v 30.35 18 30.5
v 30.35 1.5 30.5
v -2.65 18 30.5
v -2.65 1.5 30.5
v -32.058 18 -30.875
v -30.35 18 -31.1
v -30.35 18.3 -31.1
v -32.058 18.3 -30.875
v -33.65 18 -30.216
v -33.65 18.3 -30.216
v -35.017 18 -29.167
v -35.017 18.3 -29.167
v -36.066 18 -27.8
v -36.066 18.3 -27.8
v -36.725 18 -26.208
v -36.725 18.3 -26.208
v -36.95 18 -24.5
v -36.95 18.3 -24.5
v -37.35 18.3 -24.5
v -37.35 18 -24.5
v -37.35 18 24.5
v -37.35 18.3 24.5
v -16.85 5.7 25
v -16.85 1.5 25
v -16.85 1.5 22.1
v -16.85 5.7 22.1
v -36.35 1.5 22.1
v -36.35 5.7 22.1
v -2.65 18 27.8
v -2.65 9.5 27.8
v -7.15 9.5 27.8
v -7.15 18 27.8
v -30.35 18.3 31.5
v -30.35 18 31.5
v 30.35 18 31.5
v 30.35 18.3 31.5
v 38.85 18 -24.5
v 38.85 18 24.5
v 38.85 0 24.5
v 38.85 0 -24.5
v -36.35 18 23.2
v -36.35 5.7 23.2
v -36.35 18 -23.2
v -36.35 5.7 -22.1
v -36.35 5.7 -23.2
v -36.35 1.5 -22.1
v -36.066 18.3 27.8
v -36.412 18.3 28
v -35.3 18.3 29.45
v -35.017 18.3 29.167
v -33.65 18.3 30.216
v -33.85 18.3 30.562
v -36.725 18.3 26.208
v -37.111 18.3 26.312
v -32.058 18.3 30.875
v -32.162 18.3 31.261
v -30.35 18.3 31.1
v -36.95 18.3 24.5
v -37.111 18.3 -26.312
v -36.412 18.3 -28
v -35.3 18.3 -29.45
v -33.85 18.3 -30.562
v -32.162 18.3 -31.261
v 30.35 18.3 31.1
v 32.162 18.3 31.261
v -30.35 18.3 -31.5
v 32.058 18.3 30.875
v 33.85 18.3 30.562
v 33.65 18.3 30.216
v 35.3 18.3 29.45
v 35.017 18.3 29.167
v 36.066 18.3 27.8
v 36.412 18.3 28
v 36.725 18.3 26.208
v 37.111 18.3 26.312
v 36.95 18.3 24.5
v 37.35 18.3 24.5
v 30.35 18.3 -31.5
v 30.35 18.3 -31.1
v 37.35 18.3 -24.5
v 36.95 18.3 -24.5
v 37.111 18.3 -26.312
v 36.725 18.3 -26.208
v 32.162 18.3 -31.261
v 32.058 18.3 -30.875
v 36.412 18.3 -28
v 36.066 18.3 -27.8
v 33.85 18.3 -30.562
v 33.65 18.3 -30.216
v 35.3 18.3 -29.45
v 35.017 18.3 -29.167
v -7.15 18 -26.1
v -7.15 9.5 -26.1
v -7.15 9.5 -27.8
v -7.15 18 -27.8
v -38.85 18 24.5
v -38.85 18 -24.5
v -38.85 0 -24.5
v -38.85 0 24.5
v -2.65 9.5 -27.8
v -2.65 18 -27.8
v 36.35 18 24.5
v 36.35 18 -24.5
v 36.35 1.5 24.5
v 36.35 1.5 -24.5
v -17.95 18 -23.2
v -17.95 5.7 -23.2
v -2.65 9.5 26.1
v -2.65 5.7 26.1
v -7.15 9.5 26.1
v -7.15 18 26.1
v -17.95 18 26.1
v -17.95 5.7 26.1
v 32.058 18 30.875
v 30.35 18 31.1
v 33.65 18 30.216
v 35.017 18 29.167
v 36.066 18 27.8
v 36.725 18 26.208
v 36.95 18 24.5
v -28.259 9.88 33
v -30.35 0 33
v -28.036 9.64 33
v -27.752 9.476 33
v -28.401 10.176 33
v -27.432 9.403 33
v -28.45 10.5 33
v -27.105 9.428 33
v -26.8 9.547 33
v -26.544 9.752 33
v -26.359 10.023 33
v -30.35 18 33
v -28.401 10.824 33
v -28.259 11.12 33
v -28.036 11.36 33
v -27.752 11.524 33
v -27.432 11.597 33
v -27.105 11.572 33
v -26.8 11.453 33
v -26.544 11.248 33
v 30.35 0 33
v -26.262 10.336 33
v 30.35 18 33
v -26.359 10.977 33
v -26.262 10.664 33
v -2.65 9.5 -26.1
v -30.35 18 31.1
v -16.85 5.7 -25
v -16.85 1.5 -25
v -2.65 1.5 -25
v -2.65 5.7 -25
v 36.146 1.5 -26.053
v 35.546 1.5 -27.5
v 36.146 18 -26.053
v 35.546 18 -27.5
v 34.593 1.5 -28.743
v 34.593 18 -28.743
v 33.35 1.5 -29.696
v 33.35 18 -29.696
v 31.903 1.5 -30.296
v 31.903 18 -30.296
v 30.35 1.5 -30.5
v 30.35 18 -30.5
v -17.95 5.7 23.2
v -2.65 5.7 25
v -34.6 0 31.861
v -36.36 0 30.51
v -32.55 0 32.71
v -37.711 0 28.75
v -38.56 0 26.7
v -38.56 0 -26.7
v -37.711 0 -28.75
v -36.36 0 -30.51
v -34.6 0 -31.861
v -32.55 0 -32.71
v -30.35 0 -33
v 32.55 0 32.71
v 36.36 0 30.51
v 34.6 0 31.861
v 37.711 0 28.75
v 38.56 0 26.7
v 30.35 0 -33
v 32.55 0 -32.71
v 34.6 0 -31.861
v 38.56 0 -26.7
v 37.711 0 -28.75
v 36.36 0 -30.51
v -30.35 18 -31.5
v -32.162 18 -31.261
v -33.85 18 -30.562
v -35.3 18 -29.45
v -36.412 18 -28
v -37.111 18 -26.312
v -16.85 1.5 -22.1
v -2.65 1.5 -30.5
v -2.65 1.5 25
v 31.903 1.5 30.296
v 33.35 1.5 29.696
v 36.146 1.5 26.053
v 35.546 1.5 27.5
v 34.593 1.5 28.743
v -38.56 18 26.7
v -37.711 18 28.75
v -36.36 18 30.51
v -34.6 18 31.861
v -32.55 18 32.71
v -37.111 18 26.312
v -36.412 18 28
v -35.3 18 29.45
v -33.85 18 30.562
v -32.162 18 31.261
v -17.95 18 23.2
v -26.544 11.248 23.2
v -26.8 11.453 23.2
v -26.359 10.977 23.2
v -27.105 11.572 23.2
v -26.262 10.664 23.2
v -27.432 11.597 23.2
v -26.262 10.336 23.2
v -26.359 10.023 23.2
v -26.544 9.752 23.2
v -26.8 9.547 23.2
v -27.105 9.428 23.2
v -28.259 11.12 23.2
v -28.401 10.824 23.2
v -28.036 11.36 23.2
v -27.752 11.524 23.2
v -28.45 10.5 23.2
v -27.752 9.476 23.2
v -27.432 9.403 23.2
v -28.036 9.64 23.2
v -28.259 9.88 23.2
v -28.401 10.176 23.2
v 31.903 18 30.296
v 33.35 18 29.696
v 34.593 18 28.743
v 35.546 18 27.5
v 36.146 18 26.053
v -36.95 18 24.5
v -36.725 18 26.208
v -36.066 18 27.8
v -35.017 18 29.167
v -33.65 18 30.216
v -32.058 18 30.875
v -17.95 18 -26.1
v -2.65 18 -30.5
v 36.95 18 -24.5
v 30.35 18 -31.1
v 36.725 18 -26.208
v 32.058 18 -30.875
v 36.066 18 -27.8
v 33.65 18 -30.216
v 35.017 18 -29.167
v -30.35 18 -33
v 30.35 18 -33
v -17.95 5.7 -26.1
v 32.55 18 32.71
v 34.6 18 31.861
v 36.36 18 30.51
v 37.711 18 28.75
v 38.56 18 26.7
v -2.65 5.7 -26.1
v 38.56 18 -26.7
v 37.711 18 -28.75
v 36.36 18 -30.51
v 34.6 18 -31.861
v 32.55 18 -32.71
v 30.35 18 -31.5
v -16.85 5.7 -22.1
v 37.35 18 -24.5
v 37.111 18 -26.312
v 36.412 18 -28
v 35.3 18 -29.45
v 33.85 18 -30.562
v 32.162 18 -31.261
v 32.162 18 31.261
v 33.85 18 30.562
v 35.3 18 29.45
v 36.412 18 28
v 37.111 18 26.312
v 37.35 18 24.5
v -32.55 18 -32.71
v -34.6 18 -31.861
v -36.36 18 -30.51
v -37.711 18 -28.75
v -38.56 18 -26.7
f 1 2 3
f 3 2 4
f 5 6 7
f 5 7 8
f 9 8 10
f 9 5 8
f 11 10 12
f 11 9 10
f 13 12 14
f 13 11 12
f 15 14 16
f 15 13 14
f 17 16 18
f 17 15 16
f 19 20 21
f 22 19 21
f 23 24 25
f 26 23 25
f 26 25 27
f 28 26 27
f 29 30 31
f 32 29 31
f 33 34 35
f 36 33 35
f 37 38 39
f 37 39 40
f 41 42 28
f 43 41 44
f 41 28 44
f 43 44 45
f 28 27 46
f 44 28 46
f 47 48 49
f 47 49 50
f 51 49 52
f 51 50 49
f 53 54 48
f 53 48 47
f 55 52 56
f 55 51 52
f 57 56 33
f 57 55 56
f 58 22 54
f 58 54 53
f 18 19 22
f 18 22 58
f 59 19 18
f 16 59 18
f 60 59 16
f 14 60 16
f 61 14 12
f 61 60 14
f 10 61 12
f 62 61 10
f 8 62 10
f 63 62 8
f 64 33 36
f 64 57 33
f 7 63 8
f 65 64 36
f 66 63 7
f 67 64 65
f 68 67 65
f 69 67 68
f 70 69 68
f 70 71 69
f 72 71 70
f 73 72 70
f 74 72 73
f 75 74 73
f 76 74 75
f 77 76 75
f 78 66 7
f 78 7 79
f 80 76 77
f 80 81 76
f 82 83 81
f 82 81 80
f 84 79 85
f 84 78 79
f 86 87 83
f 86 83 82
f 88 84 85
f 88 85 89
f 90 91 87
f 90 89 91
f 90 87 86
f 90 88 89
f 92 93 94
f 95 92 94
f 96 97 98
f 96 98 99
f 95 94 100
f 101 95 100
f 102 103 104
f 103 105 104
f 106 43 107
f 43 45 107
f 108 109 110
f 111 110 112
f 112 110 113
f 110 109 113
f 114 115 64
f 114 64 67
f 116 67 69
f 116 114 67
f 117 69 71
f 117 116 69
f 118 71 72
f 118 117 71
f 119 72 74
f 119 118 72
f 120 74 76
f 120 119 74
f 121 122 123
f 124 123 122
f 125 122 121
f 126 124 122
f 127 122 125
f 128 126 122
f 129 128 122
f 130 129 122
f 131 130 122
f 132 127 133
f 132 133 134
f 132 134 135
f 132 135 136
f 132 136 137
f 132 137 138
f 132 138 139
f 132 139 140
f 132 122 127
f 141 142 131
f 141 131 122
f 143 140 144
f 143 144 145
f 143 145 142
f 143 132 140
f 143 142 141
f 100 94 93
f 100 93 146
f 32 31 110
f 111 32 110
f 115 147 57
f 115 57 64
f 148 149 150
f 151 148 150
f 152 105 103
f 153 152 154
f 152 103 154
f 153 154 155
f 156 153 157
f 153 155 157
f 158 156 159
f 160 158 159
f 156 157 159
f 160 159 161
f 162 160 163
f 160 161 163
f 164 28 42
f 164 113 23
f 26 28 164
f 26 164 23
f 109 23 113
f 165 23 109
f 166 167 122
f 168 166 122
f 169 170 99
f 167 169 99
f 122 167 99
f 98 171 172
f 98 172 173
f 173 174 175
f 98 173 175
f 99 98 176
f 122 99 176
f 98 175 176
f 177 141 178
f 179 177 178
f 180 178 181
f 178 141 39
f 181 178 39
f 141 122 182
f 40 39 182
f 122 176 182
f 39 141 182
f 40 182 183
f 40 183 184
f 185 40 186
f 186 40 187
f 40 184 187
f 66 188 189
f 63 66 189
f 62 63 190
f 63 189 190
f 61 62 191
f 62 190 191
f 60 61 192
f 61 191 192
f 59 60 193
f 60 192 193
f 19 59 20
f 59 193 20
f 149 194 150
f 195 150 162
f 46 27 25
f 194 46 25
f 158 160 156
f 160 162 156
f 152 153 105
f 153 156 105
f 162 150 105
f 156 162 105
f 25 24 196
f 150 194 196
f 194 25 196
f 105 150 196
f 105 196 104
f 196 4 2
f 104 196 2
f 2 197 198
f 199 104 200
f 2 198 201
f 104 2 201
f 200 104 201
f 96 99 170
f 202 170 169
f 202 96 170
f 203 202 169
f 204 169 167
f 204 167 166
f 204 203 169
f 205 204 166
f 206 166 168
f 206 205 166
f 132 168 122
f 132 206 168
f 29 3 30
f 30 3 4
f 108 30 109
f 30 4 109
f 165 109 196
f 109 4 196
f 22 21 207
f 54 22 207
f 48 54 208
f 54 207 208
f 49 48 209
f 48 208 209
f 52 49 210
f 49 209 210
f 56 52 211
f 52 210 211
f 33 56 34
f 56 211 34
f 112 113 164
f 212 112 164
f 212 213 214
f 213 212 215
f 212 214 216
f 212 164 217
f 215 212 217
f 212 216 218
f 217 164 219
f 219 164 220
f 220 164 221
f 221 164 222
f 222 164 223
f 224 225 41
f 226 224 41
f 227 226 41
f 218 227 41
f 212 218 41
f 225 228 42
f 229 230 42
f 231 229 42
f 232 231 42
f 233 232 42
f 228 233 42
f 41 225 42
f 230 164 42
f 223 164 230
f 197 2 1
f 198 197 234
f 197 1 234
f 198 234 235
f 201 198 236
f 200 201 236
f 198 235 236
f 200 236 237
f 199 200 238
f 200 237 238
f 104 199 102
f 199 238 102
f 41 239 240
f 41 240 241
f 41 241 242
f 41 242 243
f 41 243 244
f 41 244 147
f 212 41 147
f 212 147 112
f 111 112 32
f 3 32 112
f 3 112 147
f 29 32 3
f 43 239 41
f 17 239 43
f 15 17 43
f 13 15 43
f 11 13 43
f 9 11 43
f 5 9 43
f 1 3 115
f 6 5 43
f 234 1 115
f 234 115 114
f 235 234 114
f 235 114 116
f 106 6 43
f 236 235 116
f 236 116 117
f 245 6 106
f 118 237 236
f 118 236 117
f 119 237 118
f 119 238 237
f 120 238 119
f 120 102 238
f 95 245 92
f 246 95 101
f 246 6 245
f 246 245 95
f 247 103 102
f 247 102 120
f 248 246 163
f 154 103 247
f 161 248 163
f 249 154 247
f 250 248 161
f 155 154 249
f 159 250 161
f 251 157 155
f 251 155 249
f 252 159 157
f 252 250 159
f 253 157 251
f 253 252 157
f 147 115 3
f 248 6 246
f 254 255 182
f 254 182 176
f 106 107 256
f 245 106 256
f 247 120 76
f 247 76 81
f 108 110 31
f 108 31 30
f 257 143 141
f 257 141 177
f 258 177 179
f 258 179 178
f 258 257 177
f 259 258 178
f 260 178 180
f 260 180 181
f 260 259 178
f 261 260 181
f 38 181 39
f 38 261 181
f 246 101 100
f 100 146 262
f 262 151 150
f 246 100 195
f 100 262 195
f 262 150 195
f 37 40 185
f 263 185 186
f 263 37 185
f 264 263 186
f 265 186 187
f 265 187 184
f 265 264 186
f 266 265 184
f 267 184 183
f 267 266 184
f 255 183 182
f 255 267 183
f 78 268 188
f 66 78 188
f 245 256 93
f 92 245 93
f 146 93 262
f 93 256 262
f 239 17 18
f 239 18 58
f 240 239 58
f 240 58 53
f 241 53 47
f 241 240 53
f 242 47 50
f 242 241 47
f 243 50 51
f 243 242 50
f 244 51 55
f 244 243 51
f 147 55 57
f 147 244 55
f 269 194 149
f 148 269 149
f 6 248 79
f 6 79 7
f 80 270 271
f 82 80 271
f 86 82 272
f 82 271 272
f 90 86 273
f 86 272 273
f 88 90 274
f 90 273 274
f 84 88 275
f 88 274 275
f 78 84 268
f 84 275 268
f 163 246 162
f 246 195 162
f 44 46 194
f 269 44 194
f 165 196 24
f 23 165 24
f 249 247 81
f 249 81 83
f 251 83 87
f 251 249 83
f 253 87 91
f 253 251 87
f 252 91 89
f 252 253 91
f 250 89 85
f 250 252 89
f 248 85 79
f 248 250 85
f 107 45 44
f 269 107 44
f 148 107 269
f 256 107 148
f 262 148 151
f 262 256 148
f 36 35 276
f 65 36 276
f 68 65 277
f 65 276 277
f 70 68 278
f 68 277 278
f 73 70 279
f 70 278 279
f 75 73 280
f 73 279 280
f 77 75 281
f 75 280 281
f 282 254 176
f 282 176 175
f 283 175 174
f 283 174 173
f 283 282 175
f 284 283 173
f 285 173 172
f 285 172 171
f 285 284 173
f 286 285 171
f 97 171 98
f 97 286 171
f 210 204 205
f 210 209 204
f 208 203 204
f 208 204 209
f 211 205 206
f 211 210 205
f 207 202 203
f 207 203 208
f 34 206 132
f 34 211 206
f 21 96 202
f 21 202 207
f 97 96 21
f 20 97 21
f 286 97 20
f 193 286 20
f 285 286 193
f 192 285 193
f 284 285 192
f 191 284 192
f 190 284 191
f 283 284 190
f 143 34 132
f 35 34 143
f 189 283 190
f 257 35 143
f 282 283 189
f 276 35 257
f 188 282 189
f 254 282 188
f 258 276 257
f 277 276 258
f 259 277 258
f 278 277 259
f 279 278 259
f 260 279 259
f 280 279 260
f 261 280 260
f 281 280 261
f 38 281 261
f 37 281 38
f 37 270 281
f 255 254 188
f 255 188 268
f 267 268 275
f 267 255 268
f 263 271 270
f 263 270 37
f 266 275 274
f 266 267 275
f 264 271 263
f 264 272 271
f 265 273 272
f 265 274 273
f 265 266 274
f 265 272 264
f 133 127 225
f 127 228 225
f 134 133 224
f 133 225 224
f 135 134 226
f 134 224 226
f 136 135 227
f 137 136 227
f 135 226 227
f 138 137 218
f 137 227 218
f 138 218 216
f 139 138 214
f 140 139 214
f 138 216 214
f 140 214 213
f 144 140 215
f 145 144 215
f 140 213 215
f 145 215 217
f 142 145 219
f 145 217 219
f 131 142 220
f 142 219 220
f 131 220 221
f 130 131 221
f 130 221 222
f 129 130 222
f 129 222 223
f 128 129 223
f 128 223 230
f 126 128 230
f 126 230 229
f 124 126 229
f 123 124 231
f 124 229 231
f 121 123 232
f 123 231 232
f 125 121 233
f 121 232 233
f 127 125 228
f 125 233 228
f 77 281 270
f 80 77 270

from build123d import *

# Parameters (mm, degrees)
SKETCH1_W            = 72.7
SKETCH1_H            = 61
BOSS_EXTRUDE1_DEPTH  = 1.5
SKETCH3_W            = 76.7
SKETCH3_H            = 65
BOSS_EXTRUDE5_DEPTH  = 1.5
SKETCH2_W            = 76.7
SKETCH2_H            = 65
BOSS_EXTRUDE6_DEPTH  = 4.2
SKETCH4_W            = 76.7
SKETCH4_H            = 65
BOSS_EXTRUDE7_DEPTH  = 3.8
SKETCH5_W            = 76.7
SKETCH5_H            = 65
BOSS_EXTRUDE8_DEPTH  = 8.5
SKETCH7_R            = 1.1
CUT_EXTRUDE1_DEPTH   = 20.8
FILLET3_R            = 8
SKETCH9_W            = 1.2
SKETCH9_H            = 4
CUT_EXTRUDE2_DEPTH   = 8
BOSS_EXTRUDE11_DEPTH = 4.2
FILLET4_R            = 6
FILLET2_R            = 8
BOSS_EXTRUDE12_DEPTH = 18
BOSS_EXTRUDE13_DEPTH = 0.3
SKETCH14_R           = 1.1
CUT_EXTRUDE3_DEPTH   = 14


with BuildPart() as part:
    # Sketch1 → Boss-Extrude1 (new body)
    with BuildSketch(Plane(origin=(0, 0, 0), x_dir=(1, 0, 0), z_dir=(0, 1, 0))):
        Rectangle(SKETCH1_W, SKETCH1_H)
    extrude(amount=BOSS_EXTRUDE1_DEPTH)

    # Sketch3 → Boss-Extrude5 (add)
    with BuildSketch(Plane.XZ):
        Rectangle(SKETCH3_W, SKETCH3_H)
    extrude(amount=-BOSS_EXTRUDE5_DEPTH)

    # Sketch2 → Boss-Extrude6 (add)
    with BuildSketch(Plane(origin=(0, 1.5, 0), x_dir=(1, 0, 0), z_dir=(0, 1, 0))):
        Rectangle(SKETCH2_W, SKETCH2_H)
        Polygon((-2.65, 30.5), (-2.65, 26.1), (-2.65, 22.1), (-3.85, 22.1), (-3.85, 26.1), (-17.95, 26.1), (-17.95, 22.1), (-36.35, 22.1), (-36.35, -22.1), (-17.95, -22.1), (-17.95, -26.1), (-3.85, -26.1), (-3.85, -22.1), (-2.65, -22.1), (-2.65, -26.1), (-2.65, -30.5), (36.35, -30.5), (36.35, 30.5), align=None, mode=Mode.SUBTRACT)
    extrude(amount=BOSS_EXTRUDE6_DEPTH)

    # Sketch4 → Boss-Extrude7 (add)
    with BuildSketch(Plane(origin=(0, 5.7, 0), x_dir=(1, 0, 0), z_dir=(0, 1, 0))):
        Rectangle(SKETCH4_W, SKETCH4_H)
        Polygon((-36.35, -22.1), (-36.35, -23.2), (-17.95, -23.2), (-17.95, -26.1), (-3.85, -26.1), (-3.85, -22.1), (-2.65, -22.1), (-2.65, -30.5), (36.35, -30.5), (36.35, 30.5), (-2.65, 30.5), (-2.65, 22.1), (-3.85, 22.1), (-3.85, 26.1), (-17.95, 26.1), (-17.95, 23.2), (-36.35, 23.2), (-36.35, 22.1), align=None, mode=Mode.SUBTRACT)
    extrude(amount=BOSS_EXTRUDE7_DEPTH)

    # Sketch5 → Boss-Extrude8 (add)
    with BuildSketch(Plane(origin=(0, 9.5, 0), x_dir=(1, 0, 0), z_dir=(0, 1, 0))):
        Rectangle(SKETCH5_W, SKETCH5_H)
        Polygon((-2.65, -27.8), (-3.85, -27.8), (-7.15, -27.8), (-7.15, -26.1), (-17.95, -26.1), (-17.95, -23.2), (-36.35, -23.2), (-36.35, 23.2), (-17.95, 23.2), (-17.95, 26.1), (-7.15, 26.1), (-7.15, 27.8), (-3.85, 27.8), (-2.65, 27.8), (-2.65, 30.5), (36.35, 30.5), (36.35, -30.5), (-2.65, -30.5), align=None, mode=Mode.SUBTRACT)
    extrude(amount=BOSS_EXTRUDE8_DEPTH)

    # Sketch7 → Cut-Extrude1 (cut)
    with BuildSketch(Plane(origin=(0, 0, 23.2), x_dir=(-1, 0, 0), z_dir=(0, 0, -1))):
        with Locations((27.35, 10.5)):
            Circle(SKETCH7_R)
    extrude(amount=-CUT_EXTRUDE1_DEPTH, mode=Mode.SUBTRACT)

    # Fillet3
    fillet3_edges = [part.edges().sort_by_distance(p)[0] for p in [
        (-38.35, 9, -32.5),
        (-38.35, 9, 32.5),
    ]]
    fillet(fillet3_edges, radius=FILLET3_R)

    # Sketch9 → Cut-Extrude2 (cut)
    with BuildSketch(Plane(origin=(0, 9.5, 0), x_dir=(1, 0, 0), z_dir=(0, 1, 0))):
        with Locations((-3.25, 24.1)):
            Rectangle(SKETCH9_W, SKETCH9_H)
        with Locations((-3.25, -24.1)):
            Rectangle(SKETCH9_W, SKETCH9_H)
    extrude(amount=-CUT_EXTRUDE2_DEPTH, mode=Mode.SUBTRACT)

    # Sketch11 → Boss-Extrude11 (add)
    with BuildSketch(Plane(origin=(0, 1.5, 0), x_dir=(1, 0, 0), z_dir=(0, 1, 0))):
        Polygon((-16.85, -22.1), (-17.95, -22.1), (-17.95, -26.1), (-2.65, -26.1), (-2.65, -25), (-16.85, -25), align=None)
        Polygon((-17.95, 26.1), (-17.95, 22.1), (-16.85, 22.1), (-16.85, 25), (-2.65, 25), (-2.65, 26.1), align=None)
    extrude(amount=BOSS_EXTRUDE11_DEPTH)

    # Fillet4
    fillet4_edges = [part.edges().sort_by_distance(p)[0] for p in [
        (36.35, 9.75, -30.5),
        (36.35, 9.75, 30.5),
    ]]
    fillet(fillet4_edges, radius=FILLET4_R)

    # Fillet2
    fillet2_edges = [part.edges().sort_by_distance(p)[0] for p in [
        (38.35, 9, -32.5),
        (38.35, 9, 32.5),
    ]]
    fillet(fillet2_edges, radius=FILLET2_R)

    # Sketch12 → Boss-Extrude12 (add)
    with BuildSketch(Plane(origin=(0, 18, 0), x_dir=(1, 0, 0), z_dir=(0, 1, 0))):
        with BuildLine():
            Line((-30.35, -33), (30.35, -33))
            ThreePointArc((30.35, -33), (36.36040764, -30.51040764), (38.85, -24.5))
            Line((38.85, -24.5), (38.85, 24.5))
            ThreePointArc((38.85, 24.5), (36.36040764, 30.51040764), (30.35, 33))
            Line((30.35, 33), (-30.35, 33))
            ThreePointArc((-30.35, 33), (-36.36040764, 30.51040764), (-38.85, 24.5))
            Line((-38.85, 24.5), (-38.85, -24.5))
            ThreePointArc((-38.85, -24.5), (-36.36040764, -30.51040764), (-30.35, -33))
        make_face()
        with BuildLine():
            Line((38.35, -24.5), (38.35, 24.5))
            ThreePointArc((38.35, 24.5), (36.006854249, 30.156854249), (30.35, 32.5))
            Line((30.35, 32.5), (-30.35, 32.5))
            ThreePointArc((-30.35, 32.5), (-36.006854249, 30.156854249), (-38.35, 24.5))
            Line((-38.35, 24.5), (-38.35, -24.5))
            ThreePointArc((-38.35, -24.5), (-36.006854249, -30.156854249), (-30.35, -32.5))
            Line((-30.35, -32.5), (30.35, -32.5))
            ThreePointArc((30.35, -32.5), (36.006854249, -30.156854249), (38.35, -24.5))
        make_face(mode=Mode.SUBTRACT)
    extrude(amount=-BOSS_EXTRUDE12_DEPTH)

    # Sketch13 → Boss-Extrude13 (add)
    with BuildSketch(Plane(origin=(0, 18, 0), x_dir=(1, 0, 0), z_dir=(0, 1, 0))):
        with BuildLine():
            Line((-30.35, -31.5), (30.35, -31.5))
            ThreePointArc((30.35, -31.5), (35.299747468, -29.449747468), (37.35, -24.5))
            Line((37.35, -24.5), (37.35, 24.5))
            ThreePointArc((37.35, 24.5), (35.299747468, 29.449747468), (30.35, 31.5))
            Line((30.35, 31.5), (-30.35, 31.5))
            ThreePointArc((-30.35, 31.5), (-35.299747468, 29.449747468), (-37.35, 24.5))
            Line((-37.35, 24.5), (-37.35, -24.5))
            ThreePointArc((-37.35, -24.5), (-35.299747468, -29.449747468), (-30.35, -31.5))
        make_face()
        with BuildLine():
            Line((-36.95, 24.5), (-36.95, -24.5))
            ThreePointArc((-36.95, -24.5), (-35.016904756, -29.166904756), (-30.35, -31.1))
            Line((-30.35, -31.1), (30.35, -31.1))
            ThreePointArc((30.35, -31.1), (35.016904756, -29.166904756), (36.95, -24.5))
            Line((36.95, -24.5), (36.95, 24.5))
            ThreePointArc((36.95, 24.5), (35.016904756, 29.166904756), (30.35, 31.1))
            Line((30.35, 31.1), (-30.35, 31.1))
            ThreePointArc((-30.35, 31.1), (-35.016904756, 29.166904756), (-36.95, 24.5))
        make_face(mode=Mode.SUBTRACT)
    extrude(amount=BOSS_EXTRUDE13_DEPTH)

    # Sketch14 → Cut-Extrude3 (cut)
    with BuildSketch(Plane(origin=(0, 0, 23.2), x_dir=(-1, 0, 0), z_dir=(0, 0, -1))):
        with Locations((27.35, 10.5)):
            Circle(SKETCH14_R)
    extrude(amount=-CUT_EXTRUDE3_DEPTH, mode=Mode.SUBTRACT)


solid = part.part
